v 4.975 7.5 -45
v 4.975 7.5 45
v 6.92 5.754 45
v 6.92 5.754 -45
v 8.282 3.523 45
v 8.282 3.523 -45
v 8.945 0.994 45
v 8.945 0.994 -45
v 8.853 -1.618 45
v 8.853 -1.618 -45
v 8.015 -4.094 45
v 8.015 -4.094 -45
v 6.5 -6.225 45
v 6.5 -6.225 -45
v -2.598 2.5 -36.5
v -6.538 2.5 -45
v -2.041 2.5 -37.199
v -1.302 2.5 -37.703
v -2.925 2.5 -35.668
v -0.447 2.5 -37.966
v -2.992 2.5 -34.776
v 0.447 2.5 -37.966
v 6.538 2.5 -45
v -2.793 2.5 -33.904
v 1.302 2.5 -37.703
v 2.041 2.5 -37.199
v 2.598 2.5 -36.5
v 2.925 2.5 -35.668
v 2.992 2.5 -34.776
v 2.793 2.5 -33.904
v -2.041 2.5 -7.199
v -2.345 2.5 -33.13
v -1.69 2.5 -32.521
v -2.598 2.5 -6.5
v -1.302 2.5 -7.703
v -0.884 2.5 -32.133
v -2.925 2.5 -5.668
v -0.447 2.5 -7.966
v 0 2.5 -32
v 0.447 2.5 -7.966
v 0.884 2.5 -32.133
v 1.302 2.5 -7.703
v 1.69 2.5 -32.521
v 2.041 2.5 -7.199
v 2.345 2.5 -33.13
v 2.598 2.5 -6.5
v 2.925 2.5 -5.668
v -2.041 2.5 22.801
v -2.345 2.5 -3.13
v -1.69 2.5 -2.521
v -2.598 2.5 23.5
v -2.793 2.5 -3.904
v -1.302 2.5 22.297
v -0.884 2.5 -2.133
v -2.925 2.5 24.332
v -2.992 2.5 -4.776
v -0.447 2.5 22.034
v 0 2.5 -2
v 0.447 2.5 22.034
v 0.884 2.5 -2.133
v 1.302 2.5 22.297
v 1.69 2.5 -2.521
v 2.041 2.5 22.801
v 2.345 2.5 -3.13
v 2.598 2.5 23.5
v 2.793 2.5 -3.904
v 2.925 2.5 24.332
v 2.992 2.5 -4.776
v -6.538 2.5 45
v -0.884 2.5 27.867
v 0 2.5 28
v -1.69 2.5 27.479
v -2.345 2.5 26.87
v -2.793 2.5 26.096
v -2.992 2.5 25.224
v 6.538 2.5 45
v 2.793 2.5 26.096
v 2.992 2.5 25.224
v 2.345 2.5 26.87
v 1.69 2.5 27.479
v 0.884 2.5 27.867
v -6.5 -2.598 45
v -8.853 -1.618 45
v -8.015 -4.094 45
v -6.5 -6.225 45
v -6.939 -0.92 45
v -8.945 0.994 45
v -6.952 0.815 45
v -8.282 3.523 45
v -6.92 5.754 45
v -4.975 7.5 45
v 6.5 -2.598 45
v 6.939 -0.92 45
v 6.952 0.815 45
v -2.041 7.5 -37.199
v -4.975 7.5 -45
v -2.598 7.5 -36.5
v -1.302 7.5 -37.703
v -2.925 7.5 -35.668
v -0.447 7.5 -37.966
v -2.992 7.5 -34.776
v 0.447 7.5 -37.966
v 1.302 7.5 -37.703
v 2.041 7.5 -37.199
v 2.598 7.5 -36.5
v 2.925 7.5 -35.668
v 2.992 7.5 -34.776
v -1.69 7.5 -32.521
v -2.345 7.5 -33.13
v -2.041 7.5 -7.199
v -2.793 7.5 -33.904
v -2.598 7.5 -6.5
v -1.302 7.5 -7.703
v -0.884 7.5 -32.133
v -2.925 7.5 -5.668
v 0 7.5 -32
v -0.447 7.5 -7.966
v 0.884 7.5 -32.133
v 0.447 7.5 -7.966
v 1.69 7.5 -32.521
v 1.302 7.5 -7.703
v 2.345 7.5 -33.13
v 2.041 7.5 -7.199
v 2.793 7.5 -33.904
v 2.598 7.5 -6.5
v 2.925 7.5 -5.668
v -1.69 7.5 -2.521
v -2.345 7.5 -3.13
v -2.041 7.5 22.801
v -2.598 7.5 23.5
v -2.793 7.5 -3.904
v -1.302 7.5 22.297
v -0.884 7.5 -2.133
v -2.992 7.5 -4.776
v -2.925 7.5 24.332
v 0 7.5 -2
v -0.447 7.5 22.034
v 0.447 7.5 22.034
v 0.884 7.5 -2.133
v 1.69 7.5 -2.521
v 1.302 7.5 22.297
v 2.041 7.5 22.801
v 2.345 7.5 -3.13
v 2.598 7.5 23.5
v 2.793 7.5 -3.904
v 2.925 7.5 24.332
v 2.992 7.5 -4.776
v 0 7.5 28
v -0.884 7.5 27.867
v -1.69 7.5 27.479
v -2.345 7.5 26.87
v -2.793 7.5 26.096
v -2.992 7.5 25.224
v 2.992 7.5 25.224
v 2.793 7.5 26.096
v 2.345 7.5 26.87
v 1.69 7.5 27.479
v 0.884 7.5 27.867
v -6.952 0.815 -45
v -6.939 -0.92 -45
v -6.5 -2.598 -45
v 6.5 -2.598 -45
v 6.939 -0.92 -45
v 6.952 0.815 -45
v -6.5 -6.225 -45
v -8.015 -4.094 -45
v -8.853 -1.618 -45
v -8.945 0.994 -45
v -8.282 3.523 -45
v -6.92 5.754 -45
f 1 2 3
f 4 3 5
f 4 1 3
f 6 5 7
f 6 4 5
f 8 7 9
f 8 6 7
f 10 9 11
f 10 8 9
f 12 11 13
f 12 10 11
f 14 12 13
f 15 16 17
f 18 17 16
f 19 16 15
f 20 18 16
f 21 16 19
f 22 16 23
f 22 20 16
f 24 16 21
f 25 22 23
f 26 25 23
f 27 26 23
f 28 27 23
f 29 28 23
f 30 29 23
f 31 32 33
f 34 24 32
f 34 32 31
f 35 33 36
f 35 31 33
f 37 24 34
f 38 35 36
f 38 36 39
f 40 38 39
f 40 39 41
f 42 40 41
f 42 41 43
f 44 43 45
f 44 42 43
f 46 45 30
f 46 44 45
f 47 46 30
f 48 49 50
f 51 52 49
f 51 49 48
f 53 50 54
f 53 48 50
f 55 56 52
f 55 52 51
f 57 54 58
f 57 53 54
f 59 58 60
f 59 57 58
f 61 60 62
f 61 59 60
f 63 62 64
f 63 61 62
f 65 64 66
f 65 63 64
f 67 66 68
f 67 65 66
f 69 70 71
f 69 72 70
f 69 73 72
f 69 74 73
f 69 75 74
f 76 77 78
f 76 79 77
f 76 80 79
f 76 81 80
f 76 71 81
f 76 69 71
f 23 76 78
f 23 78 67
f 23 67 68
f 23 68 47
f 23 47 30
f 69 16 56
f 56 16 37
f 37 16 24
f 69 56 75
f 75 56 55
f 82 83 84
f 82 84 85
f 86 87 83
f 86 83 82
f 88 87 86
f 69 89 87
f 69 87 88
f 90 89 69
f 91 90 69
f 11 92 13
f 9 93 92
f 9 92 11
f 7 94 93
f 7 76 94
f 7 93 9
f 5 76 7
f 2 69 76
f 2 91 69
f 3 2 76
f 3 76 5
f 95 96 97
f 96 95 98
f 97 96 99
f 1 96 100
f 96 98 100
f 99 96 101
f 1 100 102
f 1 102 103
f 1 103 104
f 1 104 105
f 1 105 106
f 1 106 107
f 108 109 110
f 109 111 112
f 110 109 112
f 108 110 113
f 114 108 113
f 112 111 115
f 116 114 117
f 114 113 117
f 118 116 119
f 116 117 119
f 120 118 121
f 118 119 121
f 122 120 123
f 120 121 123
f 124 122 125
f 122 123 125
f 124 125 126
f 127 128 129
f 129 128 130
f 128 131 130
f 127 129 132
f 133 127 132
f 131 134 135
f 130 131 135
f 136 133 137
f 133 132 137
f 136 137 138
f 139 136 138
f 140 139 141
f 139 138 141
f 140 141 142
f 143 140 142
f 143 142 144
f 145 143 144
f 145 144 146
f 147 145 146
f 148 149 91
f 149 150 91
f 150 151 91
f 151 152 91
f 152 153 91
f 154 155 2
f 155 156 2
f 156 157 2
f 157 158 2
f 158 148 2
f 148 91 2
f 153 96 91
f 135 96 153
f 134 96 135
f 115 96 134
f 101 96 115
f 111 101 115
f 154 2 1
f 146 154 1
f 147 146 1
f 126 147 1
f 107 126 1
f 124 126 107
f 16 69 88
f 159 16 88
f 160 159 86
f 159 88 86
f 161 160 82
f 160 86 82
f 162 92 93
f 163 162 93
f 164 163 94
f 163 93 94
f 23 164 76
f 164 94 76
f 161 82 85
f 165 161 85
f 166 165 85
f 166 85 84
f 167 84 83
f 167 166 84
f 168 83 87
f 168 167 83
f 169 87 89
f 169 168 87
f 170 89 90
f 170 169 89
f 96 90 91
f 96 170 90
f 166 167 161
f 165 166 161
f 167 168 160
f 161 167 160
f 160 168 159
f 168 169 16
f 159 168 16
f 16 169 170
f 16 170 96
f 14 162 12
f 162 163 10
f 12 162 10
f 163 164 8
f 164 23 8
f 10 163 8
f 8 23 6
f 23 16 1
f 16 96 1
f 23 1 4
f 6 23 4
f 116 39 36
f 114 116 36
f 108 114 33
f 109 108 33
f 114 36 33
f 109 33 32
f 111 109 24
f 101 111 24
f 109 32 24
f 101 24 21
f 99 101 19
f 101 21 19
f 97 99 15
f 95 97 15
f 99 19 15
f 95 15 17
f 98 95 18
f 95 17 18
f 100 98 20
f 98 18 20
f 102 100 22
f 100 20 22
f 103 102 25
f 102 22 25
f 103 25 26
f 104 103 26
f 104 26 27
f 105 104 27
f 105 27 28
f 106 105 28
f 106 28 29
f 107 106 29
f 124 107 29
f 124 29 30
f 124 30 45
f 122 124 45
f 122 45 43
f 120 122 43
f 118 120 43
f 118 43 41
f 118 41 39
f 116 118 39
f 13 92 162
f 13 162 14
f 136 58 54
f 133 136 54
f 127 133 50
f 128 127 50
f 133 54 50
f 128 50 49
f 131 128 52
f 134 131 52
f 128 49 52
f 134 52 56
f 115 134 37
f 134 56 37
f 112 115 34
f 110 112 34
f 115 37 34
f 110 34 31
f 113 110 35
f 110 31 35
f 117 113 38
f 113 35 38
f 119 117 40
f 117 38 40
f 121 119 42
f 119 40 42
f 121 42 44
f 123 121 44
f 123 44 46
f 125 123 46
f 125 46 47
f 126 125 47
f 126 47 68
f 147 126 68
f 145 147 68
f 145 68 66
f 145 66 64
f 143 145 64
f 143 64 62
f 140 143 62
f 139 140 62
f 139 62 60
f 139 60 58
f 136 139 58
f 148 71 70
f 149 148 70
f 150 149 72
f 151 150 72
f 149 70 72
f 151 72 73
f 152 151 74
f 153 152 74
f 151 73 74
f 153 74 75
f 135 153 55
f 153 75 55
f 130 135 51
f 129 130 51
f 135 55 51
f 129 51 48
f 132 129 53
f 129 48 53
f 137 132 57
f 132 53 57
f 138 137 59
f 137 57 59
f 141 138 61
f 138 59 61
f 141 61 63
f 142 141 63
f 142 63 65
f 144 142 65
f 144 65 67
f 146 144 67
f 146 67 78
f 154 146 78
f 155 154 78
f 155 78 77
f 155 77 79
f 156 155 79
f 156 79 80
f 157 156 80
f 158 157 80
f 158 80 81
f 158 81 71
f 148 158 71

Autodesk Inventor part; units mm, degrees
ref_plane "YZ Plane" through (0, 0, 0) normal (1, 0, 0) x (0, 1, 0)
ref_plane "XZ Plane" through (0, 0, 0) normal (0, 1, 0) x (-1, 0, 0)
ref_plane "XY Plane" through (0, 0, 0) normal (0, 0, 1) x (1, 0, 0)
sketch "Szkic1" plane through (0, 0, 0) normal (0, 0, 1) x (1, 0, 0)
  circle A0 centre (0, 0) radius 9
  dimension "d0" = 18
extrude "Wyciągnięcie proste1" add sketch "Szkic1" along normal mid plane 90
sketch "Szkic2" plane through (0, 0, 45) normal (0, 0, 1) x (1, 0, 0)
  circle A0 centre (0, 0) radius 9 projected
  line L0 (-4.9749, 7.5) -> (4.9749, 7.5)
  line L1 (-6.5383, 2.5) -> (6.5383, 2.5)
  line L2 (-6.5, -2.5981) -> (-6.5, -6.2249)
  line L3 (6.5, -2.5981) -> (6.5, -6.2249)
  line L4 (0, 0) -> (0, -2.0526) construction
  arc A1 (-6.5383, 2.5) -> (-6.5, -2.5981) centre (0, 0) ccw
  arc A2 (6.5, -2.5981) -> (6.5383, 2.5) centre (0, 0) ccw
  arc A3 (-6.5, -6.2249) -> (6.5, -6.2249) centre (0, 0) ccw
  arc A4 (4.9749, 7.5) -> (-4.9749, 7.5) centre (0, 0) ccw
  dimension "d3" = 1.5
  dimension "d5" = 5
  dimension "d9" = 2
  dimension "d22" = 13
extrude "Wyciągnięcie proste2" cut sketch "Szkic2" against normal up to next contours L0 A0 | A0 L2 A1 L1 A2 L3
sketch "Szkic3" plane through (-4.9749, 7.5, 45) normal (0, 1, 0) x (1, 0, 0)
  line L0 (9.9499, 0) -> (0, 0) projected
  point P0 (4.9749, 45)
  point P1 (4.9749, 20)
  point P2 (4.9749, 50)
  point P3 (4.9749, 80)
  dimension "d12" = 20
  dimension "d13" = 30
  dimension "d14" = 30
hole "Otwór1" at (0, 7.5, 25) at (0, 7.5, -5) at (0, 7.5, -35) direction (0, -1, 0) diameter 6 end through all
properties part number "Pasek_reulacji" material "Stal nierdzewna"
